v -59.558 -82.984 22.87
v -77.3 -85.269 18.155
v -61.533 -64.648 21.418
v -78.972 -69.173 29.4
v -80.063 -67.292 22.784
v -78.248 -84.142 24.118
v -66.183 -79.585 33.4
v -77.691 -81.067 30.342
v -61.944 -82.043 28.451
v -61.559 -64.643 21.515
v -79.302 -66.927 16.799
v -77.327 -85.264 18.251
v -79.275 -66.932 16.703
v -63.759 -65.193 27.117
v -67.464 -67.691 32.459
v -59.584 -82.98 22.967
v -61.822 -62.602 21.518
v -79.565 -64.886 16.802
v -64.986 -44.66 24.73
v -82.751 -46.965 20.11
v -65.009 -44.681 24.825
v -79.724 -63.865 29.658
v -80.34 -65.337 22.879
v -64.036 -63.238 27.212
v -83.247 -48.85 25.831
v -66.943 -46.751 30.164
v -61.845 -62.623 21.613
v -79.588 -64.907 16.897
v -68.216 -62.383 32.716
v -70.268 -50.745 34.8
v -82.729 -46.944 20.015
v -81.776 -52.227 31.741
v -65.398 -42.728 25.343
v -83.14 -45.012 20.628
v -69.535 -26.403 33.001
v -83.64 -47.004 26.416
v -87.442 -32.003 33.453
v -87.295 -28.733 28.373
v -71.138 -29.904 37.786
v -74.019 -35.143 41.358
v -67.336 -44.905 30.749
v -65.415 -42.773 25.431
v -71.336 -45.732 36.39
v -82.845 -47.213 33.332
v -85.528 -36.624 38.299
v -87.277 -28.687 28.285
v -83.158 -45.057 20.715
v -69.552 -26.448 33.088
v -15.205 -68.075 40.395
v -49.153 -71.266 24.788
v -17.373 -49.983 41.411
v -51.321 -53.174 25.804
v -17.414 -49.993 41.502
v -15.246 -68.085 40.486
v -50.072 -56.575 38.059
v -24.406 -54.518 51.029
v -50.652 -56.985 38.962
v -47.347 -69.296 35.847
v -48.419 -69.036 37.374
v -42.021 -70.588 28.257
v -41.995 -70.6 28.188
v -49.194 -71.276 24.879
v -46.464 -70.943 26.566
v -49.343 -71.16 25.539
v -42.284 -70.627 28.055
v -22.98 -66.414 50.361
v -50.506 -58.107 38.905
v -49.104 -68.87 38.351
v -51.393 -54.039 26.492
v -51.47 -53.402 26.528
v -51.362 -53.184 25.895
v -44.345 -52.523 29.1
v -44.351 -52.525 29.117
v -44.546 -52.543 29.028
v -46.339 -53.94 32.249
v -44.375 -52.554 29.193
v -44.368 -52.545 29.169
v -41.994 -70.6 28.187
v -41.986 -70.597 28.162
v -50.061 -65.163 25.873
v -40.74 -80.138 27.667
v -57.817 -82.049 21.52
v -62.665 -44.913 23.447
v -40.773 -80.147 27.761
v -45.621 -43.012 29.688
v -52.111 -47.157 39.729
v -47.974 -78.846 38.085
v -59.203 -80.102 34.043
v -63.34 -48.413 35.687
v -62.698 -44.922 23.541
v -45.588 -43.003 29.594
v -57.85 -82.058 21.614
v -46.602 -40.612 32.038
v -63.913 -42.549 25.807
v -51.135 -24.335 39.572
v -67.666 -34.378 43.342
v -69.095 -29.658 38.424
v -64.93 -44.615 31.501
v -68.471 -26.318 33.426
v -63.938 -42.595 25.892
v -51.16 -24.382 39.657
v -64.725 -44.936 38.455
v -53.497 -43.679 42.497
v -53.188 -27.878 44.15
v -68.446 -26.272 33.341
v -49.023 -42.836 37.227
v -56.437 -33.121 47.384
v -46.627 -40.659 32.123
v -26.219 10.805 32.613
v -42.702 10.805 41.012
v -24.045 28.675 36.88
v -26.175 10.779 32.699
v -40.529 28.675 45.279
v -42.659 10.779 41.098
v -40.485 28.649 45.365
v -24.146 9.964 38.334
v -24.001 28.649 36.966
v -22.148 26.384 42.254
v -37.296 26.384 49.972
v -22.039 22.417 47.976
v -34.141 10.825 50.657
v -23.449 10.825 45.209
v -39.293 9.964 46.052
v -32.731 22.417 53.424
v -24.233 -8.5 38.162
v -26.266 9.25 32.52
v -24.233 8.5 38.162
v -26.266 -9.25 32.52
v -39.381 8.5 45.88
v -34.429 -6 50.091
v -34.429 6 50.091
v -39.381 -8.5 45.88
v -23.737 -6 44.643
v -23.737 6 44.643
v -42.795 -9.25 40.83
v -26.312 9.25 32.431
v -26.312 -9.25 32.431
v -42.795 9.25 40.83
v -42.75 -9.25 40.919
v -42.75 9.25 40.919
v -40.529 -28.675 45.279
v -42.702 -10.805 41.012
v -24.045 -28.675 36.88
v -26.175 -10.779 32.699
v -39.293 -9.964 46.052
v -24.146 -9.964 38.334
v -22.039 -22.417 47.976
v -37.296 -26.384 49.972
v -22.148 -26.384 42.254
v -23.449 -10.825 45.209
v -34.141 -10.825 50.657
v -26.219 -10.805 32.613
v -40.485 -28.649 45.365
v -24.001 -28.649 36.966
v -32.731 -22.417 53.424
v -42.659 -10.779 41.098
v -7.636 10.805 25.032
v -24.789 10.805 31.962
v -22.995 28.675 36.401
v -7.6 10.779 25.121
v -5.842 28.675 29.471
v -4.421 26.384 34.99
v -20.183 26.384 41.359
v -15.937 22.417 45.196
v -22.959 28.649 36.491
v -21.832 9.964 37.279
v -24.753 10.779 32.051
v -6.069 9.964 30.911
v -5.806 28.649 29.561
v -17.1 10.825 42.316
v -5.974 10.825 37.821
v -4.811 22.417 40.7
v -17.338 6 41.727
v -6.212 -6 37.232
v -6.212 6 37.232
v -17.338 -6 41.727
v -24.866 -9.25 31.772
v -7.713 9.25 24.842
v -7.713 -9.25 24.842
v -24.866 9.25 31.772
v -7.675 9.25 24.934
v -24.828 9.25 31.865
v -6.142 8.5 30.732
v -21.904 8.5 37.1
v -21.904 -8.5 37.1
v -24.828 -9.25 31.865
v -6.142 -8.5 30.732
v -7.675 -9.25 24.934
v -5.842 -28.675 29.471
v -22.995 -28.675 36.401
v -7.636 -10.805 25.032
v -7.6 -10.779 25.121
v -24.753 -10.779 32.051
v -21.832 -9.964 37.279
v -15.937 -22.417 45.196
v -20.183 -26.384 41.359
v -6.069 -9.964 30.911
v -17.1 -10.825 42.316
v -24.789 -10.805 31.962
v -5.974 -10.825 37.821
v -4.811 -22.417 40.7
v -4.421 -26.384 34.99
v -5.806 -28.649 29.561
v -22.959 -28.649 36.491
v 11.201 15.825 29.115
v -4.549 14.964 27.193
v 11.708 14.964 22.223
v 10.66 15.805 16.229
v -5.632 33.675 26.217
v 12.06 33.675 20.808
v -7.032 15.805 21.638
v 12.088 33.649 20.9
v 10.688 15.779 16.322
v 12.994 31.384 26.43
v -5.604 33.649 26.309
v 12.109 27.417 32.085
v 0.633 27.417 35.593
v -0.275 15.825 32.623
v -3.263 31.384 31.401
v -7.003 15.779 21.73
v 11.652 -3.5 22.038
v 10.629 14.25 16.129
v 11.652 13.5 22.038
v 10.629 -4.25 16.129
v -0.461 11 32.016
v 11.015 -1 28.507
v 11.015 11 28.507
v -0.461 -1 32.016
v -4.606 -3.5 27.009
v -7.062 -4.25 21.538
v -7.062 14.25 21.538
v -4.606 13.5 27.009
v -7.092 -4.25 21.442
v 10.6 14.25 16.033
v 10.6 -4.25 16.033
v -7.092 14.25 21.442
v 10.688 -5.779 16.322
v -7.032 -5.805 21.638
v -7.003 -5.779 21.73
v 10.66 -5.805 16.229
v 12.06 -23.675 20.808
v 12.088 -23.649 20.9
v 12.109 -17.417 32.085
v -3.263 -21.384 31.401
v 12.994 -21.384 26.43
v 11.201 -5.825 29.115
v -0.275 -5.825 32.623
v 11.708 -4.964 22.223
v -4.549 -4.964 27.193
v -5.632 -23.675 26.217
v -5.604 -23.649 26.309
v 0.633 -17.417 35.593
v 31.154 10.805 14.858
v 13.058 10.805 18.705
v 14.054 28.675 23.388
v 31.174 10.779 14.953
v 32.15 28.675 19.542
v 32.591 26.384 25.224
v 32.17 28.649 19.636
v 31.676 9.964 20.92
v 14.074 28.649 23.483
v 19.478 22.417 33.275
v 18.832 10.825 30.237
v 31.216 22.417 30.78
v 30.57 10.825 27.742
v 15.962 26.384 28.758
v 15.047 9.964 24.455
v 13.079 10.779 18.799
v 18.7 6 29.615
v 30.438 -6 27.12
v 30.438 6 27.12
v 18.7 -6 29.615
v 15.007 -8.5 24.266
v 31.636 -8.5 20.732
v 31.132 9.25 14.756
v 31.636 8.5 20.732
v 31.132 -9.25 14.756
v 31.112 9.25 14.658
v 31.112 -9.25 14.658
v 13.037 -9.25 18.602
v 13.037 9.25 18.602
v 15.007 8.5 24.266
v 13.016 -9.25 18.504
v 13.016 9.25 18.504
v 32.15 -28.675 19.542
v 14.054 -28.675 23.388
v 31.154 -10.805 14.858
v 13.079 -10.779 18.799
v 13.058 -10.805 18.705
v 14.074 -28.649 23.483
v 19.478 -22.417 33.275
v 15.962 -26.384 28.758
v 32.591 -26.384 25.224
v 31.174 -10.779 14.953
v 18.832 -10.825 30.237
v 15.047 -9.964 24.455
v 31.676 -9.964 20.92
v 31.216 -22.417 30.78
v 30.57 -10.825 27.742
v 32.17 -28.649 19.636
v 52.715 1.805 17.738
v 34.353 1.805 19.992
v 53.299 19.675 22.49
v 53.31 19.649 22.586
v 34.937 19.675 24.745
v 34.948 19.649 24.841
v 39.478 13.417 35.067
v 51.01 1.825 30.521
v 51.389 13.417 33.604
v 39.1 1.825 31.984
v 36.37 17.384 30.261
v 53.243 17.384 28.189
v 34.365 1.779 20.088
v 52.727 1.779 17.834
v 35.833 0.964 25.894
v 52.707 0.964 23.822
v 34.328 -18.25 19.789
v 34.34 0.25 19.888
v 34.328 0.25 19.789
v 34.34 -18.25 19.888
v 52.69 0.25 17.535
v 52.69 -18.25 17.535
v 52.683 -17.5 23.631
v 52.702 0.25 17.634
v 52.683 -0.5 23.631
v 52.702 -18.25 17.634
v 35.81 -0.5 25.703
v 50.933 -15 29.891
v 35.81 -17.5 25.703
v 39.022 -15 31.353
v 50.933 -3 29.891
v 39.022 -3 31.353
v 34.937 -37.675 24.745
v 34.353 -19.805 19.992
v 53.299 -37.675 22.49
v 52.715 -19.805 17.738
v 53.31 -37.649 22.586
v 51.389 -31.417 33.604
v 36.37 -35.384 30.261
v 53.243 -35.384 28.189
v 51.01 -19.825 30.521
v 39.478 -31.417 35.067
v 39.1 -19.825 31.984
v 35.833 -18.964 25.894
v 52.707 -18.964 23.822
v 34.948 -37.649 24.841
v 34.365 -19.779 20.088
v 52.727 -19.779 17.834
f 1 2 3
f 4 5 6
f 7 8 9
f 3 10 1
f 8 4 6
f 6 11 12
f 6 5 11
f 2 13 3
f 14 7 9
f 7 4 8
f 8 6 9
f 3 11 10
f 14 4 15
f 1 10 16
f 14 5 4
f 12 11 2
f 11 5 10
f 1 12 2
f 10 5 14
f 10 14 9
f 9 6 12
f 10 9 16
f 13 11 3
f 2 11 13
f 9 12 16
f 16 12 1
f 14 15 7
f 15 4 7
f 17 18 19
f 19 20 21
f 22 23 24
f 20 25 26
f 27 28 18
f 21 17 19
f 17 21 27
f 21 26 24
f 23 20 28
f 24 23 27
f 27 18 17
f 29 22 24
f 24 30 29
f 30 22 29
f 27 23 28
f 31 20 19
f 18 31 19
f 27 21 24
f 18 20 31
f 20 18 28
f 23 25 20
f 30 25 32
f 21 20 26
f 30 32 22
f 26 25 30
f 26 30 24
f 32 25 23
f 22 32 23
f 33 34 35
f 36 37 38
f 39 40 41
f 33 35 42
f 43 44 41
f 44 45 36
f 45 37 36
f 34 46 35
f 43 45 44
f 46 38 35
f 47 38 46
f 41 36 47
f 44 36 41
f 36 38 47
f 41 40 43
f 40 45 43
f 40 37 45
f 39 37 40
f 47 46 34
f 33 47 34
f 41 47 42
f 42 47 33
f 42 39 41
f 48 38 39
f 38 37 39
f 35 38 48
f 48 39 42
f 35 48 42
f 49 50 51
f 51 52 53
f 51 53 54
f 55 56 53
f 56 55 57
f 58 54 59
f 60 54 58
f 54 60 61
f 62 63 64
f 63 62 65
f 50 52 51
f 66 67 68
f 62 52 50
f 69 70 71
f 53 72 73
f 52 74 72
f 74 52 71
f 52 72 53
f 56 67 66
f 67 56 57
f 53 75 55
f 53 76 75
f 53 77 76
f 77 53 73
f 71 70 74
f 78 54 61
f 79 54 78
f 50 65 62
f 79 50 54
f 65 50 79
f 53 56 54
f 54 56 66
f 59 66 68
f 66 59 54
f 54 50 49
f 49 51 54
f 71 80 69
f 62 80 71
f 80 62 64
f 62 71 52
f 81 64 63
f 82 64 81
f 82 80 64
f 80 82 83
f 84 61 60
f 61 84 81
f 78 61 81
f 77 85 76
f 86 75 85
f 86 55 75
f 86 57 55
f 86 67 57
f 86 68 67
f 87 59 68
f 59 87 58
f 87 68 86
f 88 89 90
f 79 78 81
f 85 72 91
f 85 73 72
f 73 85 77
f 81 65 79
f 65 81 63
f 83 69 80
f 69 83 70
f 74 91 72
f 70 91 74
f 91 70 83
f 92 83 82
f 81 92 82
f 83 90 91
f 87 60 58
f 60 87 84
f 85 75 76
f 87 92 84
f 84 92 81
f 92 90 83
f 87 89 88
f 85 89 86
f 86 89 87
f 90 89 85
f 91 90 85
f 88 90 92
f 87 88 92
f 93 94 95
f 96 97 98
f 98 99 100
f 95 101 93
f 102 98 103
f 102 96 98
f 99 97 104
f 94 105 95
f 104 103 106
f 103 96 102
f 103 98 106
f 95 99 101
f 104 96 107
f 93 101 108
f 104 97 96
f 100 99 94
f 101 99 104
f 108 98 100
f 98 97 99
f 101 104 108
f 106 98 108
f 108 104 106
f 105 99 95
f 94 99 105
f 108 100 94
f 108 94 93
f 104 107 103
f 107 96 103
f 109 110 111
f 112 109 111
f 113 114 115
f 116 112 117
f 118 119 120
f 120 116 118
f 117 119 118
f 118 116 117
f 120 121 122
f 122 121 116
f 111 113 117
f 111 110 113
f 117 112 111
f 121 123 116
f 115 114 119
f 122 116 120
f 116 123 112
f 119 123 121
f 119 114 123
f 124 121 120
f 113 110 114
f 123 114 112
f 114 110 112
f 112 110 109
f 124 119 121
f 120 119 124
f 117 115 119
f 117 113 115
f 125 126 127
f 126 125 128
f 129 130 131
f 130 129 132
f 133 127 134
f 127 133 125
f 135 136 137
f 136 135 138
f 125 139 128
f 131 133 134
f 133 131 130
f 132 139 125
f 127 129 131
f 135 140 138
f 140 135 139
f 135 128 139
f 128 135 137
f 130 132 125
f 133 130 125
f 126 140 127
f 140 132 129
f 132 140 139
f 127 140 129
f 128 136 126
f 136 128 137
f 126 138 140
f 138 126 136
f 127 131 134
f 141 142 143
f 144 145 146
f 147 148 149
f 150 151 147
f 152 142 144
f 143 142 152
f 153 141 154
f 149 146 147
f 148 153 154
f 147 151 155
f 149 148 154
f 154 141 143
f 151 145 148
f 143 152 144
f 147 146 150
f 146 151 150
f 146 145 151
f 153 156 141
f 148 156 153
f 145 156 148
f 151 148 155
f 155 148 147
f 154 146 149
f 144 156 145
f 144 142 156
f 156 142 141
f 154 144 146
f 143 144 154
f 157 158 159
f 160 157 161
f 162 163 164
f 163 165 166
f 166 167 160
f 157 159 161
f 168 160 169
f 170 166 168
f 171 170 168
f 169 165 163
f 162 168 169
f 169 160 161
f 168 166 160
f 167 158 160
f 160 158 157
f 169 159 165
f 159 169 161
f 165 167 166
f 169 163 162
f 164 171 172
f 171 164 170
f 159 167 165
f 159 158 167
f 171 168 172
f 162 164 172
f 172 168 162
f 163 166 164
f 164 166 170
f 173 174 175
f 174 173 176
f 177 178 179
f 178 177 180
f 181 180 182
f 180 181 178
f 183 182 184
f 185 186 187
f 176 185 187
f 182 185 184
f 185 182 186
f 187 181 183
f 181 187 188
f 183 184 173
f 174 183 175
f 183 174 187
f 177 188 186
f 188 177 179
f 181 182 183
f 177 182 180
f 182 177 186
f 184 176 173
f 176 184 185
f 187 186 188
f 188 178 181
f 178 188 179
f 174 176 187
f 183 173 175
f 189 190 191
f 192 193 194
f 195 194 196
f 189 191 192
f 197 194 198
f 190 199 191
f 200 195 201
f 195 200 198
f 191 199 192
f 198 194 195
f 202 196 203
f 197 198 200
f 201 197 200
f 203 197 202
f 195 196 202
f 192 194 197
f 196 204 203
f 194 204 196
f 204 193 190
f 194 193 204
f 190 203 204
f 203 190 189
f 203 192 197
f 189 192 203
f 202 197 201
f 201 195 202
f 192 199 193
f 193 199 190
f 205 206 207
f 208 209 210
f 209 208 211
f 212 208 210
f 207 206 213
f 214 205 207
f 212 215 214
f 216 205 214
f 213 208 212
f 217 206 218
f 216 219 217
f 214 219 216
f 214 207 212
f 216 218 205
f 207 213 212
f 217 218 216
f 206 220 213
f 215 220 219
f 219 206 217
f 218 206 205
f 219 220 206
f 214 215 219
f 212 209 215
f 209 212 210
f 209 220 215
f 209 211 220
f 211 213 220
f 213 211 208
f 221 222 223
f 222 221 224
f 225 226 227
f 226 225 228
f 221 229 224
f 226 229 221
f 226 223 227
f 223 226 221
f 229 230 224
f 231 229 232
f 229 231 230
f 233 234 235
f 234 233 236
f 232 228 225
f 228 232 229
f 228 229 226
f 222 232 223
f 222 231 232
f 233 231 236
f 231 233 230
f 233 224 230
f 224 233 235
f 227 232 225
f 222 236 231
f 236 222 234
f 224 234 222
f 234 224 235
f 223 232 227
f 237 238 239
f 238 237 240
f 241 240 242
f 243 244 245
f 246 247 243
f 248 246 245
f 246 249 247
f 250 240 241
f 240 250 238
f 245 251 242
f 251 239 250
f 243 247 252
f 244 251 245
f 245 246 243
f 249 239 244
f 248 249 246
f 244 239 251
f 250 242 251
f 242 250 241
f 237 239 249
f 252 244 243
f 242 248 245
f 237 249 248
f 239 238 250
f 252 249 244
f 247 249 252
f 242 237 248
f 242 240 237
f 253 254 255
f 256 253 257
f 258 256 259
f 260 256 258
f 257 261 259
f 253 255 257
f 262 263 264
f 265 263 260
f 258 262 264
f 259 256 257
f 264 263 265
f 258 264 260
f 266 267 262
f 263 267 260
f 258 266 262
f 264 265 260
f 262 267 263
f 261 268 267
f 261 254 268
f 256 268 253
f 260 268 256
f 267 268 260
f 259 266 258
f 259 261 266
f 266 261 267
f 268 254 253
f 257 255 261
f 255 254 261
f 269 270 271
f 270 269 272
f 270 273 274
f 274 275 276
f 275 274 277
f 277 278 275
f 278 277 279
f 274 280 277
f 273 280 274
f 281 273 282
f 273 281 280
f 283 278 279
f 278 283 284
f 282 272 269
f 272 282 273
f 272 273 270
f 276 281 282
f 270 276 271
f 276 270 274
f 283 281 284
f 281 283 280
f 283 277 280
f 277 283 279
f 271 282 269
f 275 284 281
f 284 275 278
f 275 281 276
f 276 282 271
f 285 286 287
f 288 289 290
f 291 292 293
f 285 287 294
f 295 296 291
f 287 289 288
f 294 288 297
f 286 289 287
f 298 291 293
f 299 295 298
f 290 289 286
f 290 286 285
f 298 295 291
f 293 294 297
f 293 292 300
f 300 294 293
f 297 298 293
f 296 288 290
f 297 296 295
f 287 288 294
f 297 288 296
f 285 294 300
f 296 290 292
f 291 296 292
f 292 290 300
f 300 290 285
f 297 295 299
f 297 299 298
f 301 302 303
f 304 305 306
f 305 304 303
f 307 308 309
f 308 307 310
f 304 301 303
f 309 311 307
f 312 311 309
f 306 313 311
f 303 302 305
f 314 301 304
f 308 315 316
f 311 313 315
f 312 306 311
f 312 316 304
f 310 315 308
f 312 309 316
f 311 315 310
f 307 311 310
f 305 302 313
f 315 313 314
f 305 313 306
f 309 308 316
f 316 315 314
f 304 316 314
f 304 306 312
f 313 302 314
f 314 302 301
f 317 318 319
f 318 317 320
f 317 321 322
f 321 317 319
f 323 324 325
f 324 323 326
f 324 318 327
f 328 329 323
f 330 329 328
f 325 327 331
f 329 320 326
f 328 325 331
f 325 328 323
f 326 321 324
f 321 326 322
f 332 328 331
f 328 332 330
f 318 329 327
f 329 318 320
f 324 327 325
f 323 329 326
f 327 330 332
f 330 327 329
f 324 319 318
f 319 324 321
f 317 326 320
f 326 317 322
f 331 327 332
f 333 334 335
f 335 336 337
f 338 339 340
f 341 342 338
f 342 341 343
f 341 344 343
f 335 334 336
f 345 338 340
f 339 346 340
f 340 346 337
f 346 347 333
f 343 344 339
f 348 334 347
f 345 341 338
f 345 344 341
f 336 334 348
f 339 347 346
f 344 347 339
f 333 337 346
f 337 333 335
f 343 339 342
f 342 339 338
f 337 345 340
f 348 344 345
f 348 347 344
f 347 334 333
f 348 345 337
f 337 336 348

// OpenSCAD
union () {
  union () {
    translate ([-47, -50, 19]) {
      rotate (a=10.000000000000002, v=[0, 0, 1]) {
        rotate (a=10.000000000000002, v=[1, 0, 0]) {
          rotate (a=-25.0, v=[0, 1, 0]) {
            translate ([17.4, 0, 0]) {
              translate ([0, 0, 239.07818057271746]) {
                rotate (a=0.0, v=[0, 1, 0]) {
                  translate ([0, 0, -239.07818057271746]) {
                    translate ([0, 0, 87.18393769497159]) {
                      rotate (a=-7.499999999999999, v=[1, 0, 0]) {
                        translate ([0, 0, -87.18393769497159]) {
                          rotate (a=90.0, v=[0, 0, 1]) {
                            color ([127/255, 53/85, 127/255, 1]) {
                              translate ([0, 0, 9]) {
                                hull () {
                                  translate ([0, 0, 0.05]) {
                                    linear_extrude (height=0.1, twist=0.0, convexity=0, center=true){
                                      polygon (points=[[9.125, 18.75], [9.125, -18.75], [-9.125, -18.75], [-9.125, 18.75]]);
                                    }
                                  }
                                  translate ([0, 0, 12]) {
                                    linear_extrude (height=0.1, twist=0.0, convexity=0, center=true){
                                      polygon (points=[[6, 16], [6, -16], [-6, -16], [-6, 16]]);
                                    }
                                  }
                                }
                              }
                            }
                          }
                        }
                      }
                    }
                  }
                }
              }
            }
          }
        }
      }
    }
    translate ([-47, -50, 19]) {
      rotate (a=10.000000000000002, v=[0, 0, 1]) {
        rotate (a=10.000000000000002, v=[1, 0, 0]) {
          rotate (a=-25.0, v=[0, 1, 0]) {
            translate ([17.4, 0, 0]) {
              translate ([0, 0, 239.07818057271746]) {
                rotate (a=5.0, v=[0, 1, 0]) {
                  translate ([0, 0, -239.07818057271746]) {
                    translate ([0, 0, 87.18393769497159]) {
                      rotate (a=-7.499999999999999, v=[1, 0, 0]) {
                        translate ([0, 0, -87.18393769497159]) {
                          color ([127/255, 53/85, 127/255, 1]) {
                            translate ([0, 0, 9]) {
                              hull () {
                                translate ([0, 0, 0.05]) {
                                  linear_extrude (height=0.1, twist=0.0, convexity=0, center=true){
                                    polygon (points=[[9.125, 18.75], [9.125, -18.75], [-9.125, -18.75], [-9.125, 18.75]]);
                                  }
                                }
                                translate ([0, 0, 12]) {
                                  linear_extrude (height=0.1, twist=0.0, convexity=0, center=true){
                                    polygon (points=[[6, 16], [6, -16], [-6, -16], [-6, 16]]);
                                  }
                                }
                              }
                            }
                          }
                        }
                      }
                    }
                  }
                }
              }
            }
          }
        }
      }
    }
    translate ([-47, -50, 19]) {
      rotate (a=10.000000000000002, v=[0, 0, 1]) {
        rotate (a=10.000000000000002, v=[1, 0, 0]) {
          rotate (a=-25.0, v=[0, 1, 0]) {
            translate ([17.4, 0, 0]) {
              translate ([0, 0, 239.07818057271746]) {
                rotate (a=5.0, v=[0, 1, 0]) {
                  translate ([0, 0, -239.07818057271746]) {
                    translate ([0, 0, 87.18393769497159]) {
                      rotate (a=14.999999999999998, v=[1, 0, 0]) {
                        translate ([0, 0, -87.18393769497159]) {
                          color ([44/51, 163/255, 163/255, 1]) {
                            translate ([0, 0, 9]) {
                              hull () {
                                translate ([0, 0, 0.05]) {
                                  linear_extrude (height=0.1, twist=0.0, convexity=0, center=true){
                                    polygon (points=[[9.25, 9.25], [9.25, -9.25], [-9.25, -9.25], [-9.25, 9.25]]);
                                  }
                                }
                                translate ([0, 0, 6]) {
                                  linear_extrude (height=0.1, twist=0.0, convexity=0, center=true){
                                    polygon (points=[[17/2, 17/2], [17/2, -17/2], [-17/2, -17/2], [-17/2, 17/2]]);
                                  }
                                }
                                translate ([0, 0, 12]) {
                                  linear_extrude (height=0.1, twist=0.0, convexity=0, center=true){
                                    polygon (points=[[6, 6], [6, -6], [-6, -6], [-6, 6]]);
                                  }
                                }
                              }
                            }
                          }
                        }
                      }
                    }
                  }
                }
              }
            }
          }
        }
      }
    }
    union () {
      translate ([-47, -50, 19]) {
        rotate (a=10.000000000000002, v=[0, 0, 1]) {
          rotate (a=10.000000000000002, v=[1, 0, 0]) {
            rotate (a=-25.0, v=[0, 1, 0]) {
              translate ([17.4, 0, 0]) {
                translate ([0, 0, 239.07818057271746]) {
                  rotate (a=10.0, v=[0, 1, 0]) {
                    translate ([0, 0, -239.07818057271746]) {
                      translate ([0, 0, 87.18393769497159]) {
                        rotate (a=-14.999999999999998, v=[1, 0, 0]) {
                          translate ([0, 0, -87.18393769497159]) {
                            color ([44/51, 163/255, 163/255, 1]) {
                              translate ([0, 0, 9]) {
                                hull () {
                                  translate ([0, 0, 0.05]) {
                                    linear_extrude (height=0.1, twist=0.0, convexity=0, center=true){
                                      polygon (points=[[9.25, 9.25], [9.25, -9.25], [-9.25, -9.25], [-9.25, 9.25]]);
                                    }
                                  }
                                  translate ([0, 0, 6]) {
                                    linear_extrude (height=0.1, twist=0.0, convexity=0, center=true){
                                      polygon (points=[[17/2, 17/2], [17/2, -17/2], [-17/2, -17/2], [-17/2, 17/2]]);
                                    }
                                  }
                                  translate ([0, 0, 12]) {
                                    linear_extrude (height=0.1, twist=0.0, convexity=0, center=true){
                                      polygon (points=[[6, 6], [6, -6], [-6, -6], [-6, 6]]);
                                    }
                                  }
                                }
                              }
                            }
                          }
                        }
                      }
                    }
                  }
                }
              }
            }
          }
        }
      }
      translate ([-47, -50, 19]) {
        rotate (a=10.000000000000002, v=[0, 0, 1]) {
          rotate (a=10.000000000000002, v=[1, 0, 0]) {
            rotate (a=-25.0, v=[0, 1, 0]) {
              translate ([17.4, 0, 0]) {
                translate ([0, 0, 239.07818057271746]) {
                  rotate (a=10.0, v=[0, 1, 0]) {
                    translate ([0, 0, -239.07818057271746]) {
                      translate ([0, 0, 87.18393769497159]) {
                        rotate (a=0.0, v=[1, 0, 0]) {
                          translate ([0, 0, -87.18393769497159]) {
                            color ([44/51, 163/255, 163/255, 1]) {
                              translate ([0, 0, 9]) {
                                hull () {
                                  translate ([0, 0, 0.05]) {
                                    linear_extrude (height=0.1, twist=0.0, convexity=0, center=true){
                                      polygon (points=[[9.25, 9.25], [9.25, -9.25], [-9.25, -9.25], [-9.25, 9.25]]);
                                    }
                                  }
                                  translate ([0, 0, 6]) {
                                    linear_extrude (height=0.1, twist=0.0, convexity=0, center=true){
                                      polygon (points=[[17/2, 17/2], [17/2, -17/2], [-17/2, -17/2], [-17/2, 17/2]]);
                                    }
                                  }
                                  translate ([0, 0, 12]) {
                                    linear_extrude (height=0.1, twist=0.0, convexity=0, center=true){
                                      polygon (points=[[6, 6], [6, -6], [-6, -6], [-6, 6]]);
                                    }
                                  }
                                }
                              }
                            }
                          }
                        }
                      }
                    }
                  }
                }
              }
            }
          }
        }
      }
      translate ([-47, -50, 19]) {
        rotate (a=10.000000000000002, v=[0, 0, 1]) {
          rotate (a=10.000000000000002, v=[1, 0, 0]) {
            rotate (a=-25.0, v=[0, 1, 0]) {
              translate ([17.4, 0, 0]) {
                translate ([0, 0, 239.07818057271746]) {
                  rotate (a=10.0, v=[0, 1, 0]) {
                    translate ([0, 0, -239.07818057271746]) {
                      translate ([0, 0, 87.18393769497159]) {
                        rotate (a=14.999999999999998, v=[1, 0, 0]) {
                          translate ([0, 0, -87.18393769497159]) {
                            color ([44/51, 163/255, 163/255, 1]) {
                              translate ([0, 0, 9]) {
                                hull () {
                                  translate ([0, 0, 0.05]) {
                                    linear_extrude (height=0.1, twist=0.0, convexity=0, center=true){
                                      polygon (points=[[9.25, 9.25], [9.25, -9.25], [-9.25, -9.25], [-9.25, 9.25]]);
                                    }
                                  }
                                  translate ([0, 0, 6]) {
                                    linear_extrude (height=0.1, twist=0.0, convexity=0, center=true){
                                      polygon (points=[[17/2, 17/2], [17/2, -17/2], [-17/2, -17/2], [-17/2, 17/2]]);
                                    }
                                  }
                                  translate ([0, 0, 12]) {
                                    linear_extrude (height=0.1, twist=0.0, convexity=0, center=true){
                                      polygon (points=[[6, 6], [6, -6], [-6, -6], [-6, 6]]);
                                    }
                                  }
                                }
                              }
                            }
                          }
                        }
                      }
                    }
                  }
                }
              }
            }
          }
        }
      }
    }
  }
  union () {
    translate ([0, 0, 13]) {
      rotate (a=17.0, v=[0, 1, 0]) {
        translate ([0, 0, 0]) {
          translate ([0, 0, 239.0781805727174]) {
            rotate (a=10.000000000000002, v=[0, 1, 0]) {
              translate ([0, 0, -239.0781805727174]) {
                translate ([0, 0, 85.26861330108649]) {
                  rotate (a=14.999999999999998, v=[1, 0, 0]) {
                    translate ([0, 0, -85.26861330108649]) {
                      color ([44/51, 163/255, 163/255, 1]) {
                        translate ([0, 0, 9]) {
                          hull () {
                            translate ([0, 0, 0.05]) {
                              linear_extrude (height=0.1, twist=0.0, convexity=0, center=true){
                                polygon (points=[[9.25, 9.25], [9.25, -9.25], [-9.25, -9.25], [-9.25, 9.25]]);
                              }
                            }
                            translate ([0, 0, 6]) {
                              linear_extrude (height=0.1, twist=0.0, convexity=0, center=true){
                                polygon (points=[[17/2, 17/2], [17/2, -17/2], [-17/2, -17/2], [-17/2, 17/2]]);
                              }
                            }
                            translate ([0, 0, 12]) {
                              linear_extrude (height=0.1, twist=0.0, convexity=0, center=true){
                                polygon (points=[[6, 6], [6, -6], [-6, -6], [-6, 6]]);
                              }
                            }
                          }
                        }
                      }
                    }
                  }
                }
              }
            }
          }
        }
      }
    }
    translate ([0, 0, 13]) {
      rotate (a=17.0, v=[0, 1, 0]) {
        translate ([0, 0, 0]) {
          translate ([0, 0, 239.0781805727174]) {
            rotate (a=10.000000000000002, v=[0, 1, 0]) {
              translate ([0, 0, -239.0781805727174]) {
                translate ([0, 0, 85.26861330108649]) {
                  rotate (a=0.0, v=[1, 0, 0]) {
                    translate ([0, 0, -85.26861330108649]) {
                      color ([44/51, 163/255, 163/255, 1]) {
                        translate ([0, 0, 9]) {
                          hull () {
                            translate ([0, 0, 0.05]) {
                              linear_extrude (height=0.1, twist=0.0, convexity=0, center=true){
                                polygon (points=[[9.25, 9.25], [9.25, -9.25], [-9.25, -9.25], [-9.25, 9.25]]);
                              }
                            }
                            translate ([0, 0, 6]) {
                              linear_extrude (height=0.1, twist=0.0, convexity=0, center=true){
                                polygon (points=[[17/2, 17/2], [17/2, -17/2], [-17/2, -17/2], [-17/2, 17/2]]);
                              }
                            }
                            translate ([0, 0, 12]) {
                              linear_extrude (height=0.1, twist=0.0, convexity=0, center=true){
                                polygon (points=[[6, 6], [6, -6], [-6, -6], [-6, 6]]);
                              }
                            }
                          }
                        }
                      }
                    }
                  }
                }
              }
            }
          }
        }
      }
    }
    translate ([0, 0, 13]) {
      rotate (a=17.0, v=[0, 1, 0]) {
        translate ([0, 0, 0]) {
          translate ([0, 0, 239.0781805727174]) {
            rotate (a=10.000000000000002, v=[0, 1, 0]) {
              translate ([0, 0, -239.0781805727174]) {
                translate ([0, 0, 85.26861330108649]) {
                  rotate (a=-14.999999999999998, v=[1, 0, 0]) {
                    translate ([0, 0, -85.26861330108649]) {
                      color ([44/51, 163/255, 163/255, 1]) {
                        translate ([0, 0, 9]) {
                          hull () {
                            translate ([0, 0, 0.05]) {
                              linear_extrude (height=0.1, twist=0.0, convexity=0, center=true){
                                polygon (points=[[9.25, 9.25], [9.25, -9.25], [-9.25, -9.25], [-9.25, 9.25]]);
                              }
                            }
                            translate ([0, 0, 6]) {
                              linear_extrude (height=0.1, twist=0.0, convexity=0, center=true){
                                polygon (points=[[17/2, 17/2], [17/2, -17/2], [-17/2, -17/2], [-17/2, 17/2]]);
                              }
                            }
                            translate ([0, 0, 12]) {
                              linear_extrude (height=0.1, twist=0.0, convexity=0, center=true){
                                polygon (points=[[6, 6], [6, -6], [-6, -6], [-6, 6]]);
                              }
                            }
                          }
                        }
                      }
                    }
                  }
                }
              }
            }
          }
        }
      }
    }
    translate ([0, 0, 13]) {
      rotate (a=17.0, v=[0, 1, 0]) {
        translate ([0, 0, 0]) {
          translate ([0, 0, 239.0781805727174]) {
            rotate (a=5.000000000000001, v=[0, 1, 0]) {
              translate ([0, 0, -239.0781805727174]) {
                translate ([0, 0, 85.26861330108649]) {
                  rotate (a=14.999999999999998, v=[1, 0, 0]) {
                    translate ([0, 0, -85.26861330108649]) {
                      color ([44/51, 163/255, 163/255, 1]) {
                        translate ([0, 0, 9]) {
                          hull () {
                            translate ([0, 0, 0.05]) {
                              linear_extrude (height=0.1, twist=0.0, convexity=0, center=true){
                                polygon (points=[[9.25, 9.25], [9.25, -9.25], [-9.25, -9.25], [-9.25, 9.25]]);
                              }
                            }
                            translate ([0, 0, 6]) {
                              linear_extrude (height=0.1, twist=0.0, convexity=0, center=true){
                                polygon (points=[[17/2, 17/2], [17/2, -17/2], [-17/2, -17/2], [-17/2, 17/2]]);
                              }
                            }
                            translate ([0, 0, 12]) {
                              linear_extrude (height=0.1, twist=0.0, convexity=0, center=true){
                                polygon (points=[[6, 6], [6, -6], [-6, -6], [-6, 6]]);
                              }
                            }
                          }
                        }
                      }
                    }
                  }
                }
              }
            }
          }
        }
      }
    }
    translate ([0, 0, 13]) {
      rotate (a=17.0, v=[0, 1, 0]) {
        translate ([0, 0, 0]) {
          translate ([0, 0, 239.0781805727174]) {
            rotate (a=5.000000000000001, v=[0, 1, 0]) {
              translate ([0, 0, -239.0781805727174]) {
                translate ([0, 0, 85.26861330108649]) {
                  rotate (a=0.0, v=[1, 0, 0]) {
                    translate ([0, 0, -85.26861330108649]) {
                      color ([44/51, 163/255, 163/255, 1]) {
                        translate ([0, 0, 9]) {
                          hull () {
                            translate ([0, 0, 0.05]) {
                              linear_extrude (height=0.1, twist=0.0, convexity=0, center=true){
                                polygon (points=[[9.25, 9.25], [9.25, -9.25], [-9.25, -9.25], [-9.25, 9.25]]);
                              }
                            }
                            translate ([0, 0, 6]) {
                              linear_extrude (height=0.1, twist=0.0, convexity=0, center=true){
                                polygon (points=[[17/2, 17/2], [17/2, -17/2], [-17/2, -17/2], [-17/2, 17/2]]);
                              }
                            }
                            translate ([0, 0, 12]) {
                              linear_extrude (height=0.1, twist=0.0, convexity=0, center=true){
                                polygon (points=[[6, 6], [6, -6], [-6, -6], [-6, 6]]);
                              }
                            }
                          }
                        }
                      }
                    }
                  }
                }
              }
            }
          }
        }
      }
    }
    translate ([0, 0, 13]) {
      rotate (a=17.0, v=[0, 1, 0]) {
        translate ([0, 0, 0]) {
          translate ([0, 0, 239.0781805727174]) {
            rotate (a=5.000000000000001, v=[0, 1, 0]) {
              translate ([0, 0, -239.0781805727174]) {
                translate ([0, 0, 85.26861330108649]) {
                  rotate (a=-14.999999999999998, v=[1, 0, 0]) {
                    translate ([0, 0, -85.26861330108649]) {
                      color ([44/51, 163/255, 163/255, 1]) {
                        translate ([0, 0, 9]) {
                          hull () {
                            translate ([0, 0, 0.05]) {
                              linear_extrude (height=0.1, twist=0.0, convexity=0, center=true){
                                polygon (points=[[9.25, 9.25], [9.25, -9.25], [-9.25, -9.25], [-9.25, 9.25]]);
                              }
                            }
                            translate ([0, 0, 6]) {
                              linear_extrude (height=0.1, twist=0.0, convexity=0, center=true){
                                polygon (points=[[17/2, 17/2], [17/2, -17/2], [-17/2, -17/2], [-17/2, 17/2]]);
                              }
                            }
                            translate ([0, 0, 12]) {
                              linear_extrude (height=0.1, twist=0.0, convexity=0, center=true){
                                polygon (points=[[6, 6], [6, -6], [-6, -6], [-6, 6]]);
                              }
                            }
                          }
                        }
                      }
                    }
                  }
                }
              }
            }
          }
        }
      }
    }
    translate ([0, 0, 13]) {
      rotate (a=17.0, v=[0, 1, 0]) {
        translate ([0, 5, -3.0]) {
          translate ([0, 0, 239.0781805727174]) {
            rotate (a=0.0, v=[0, 1, 0]) {
              translate ([0, 0, -239.0781805727174]) {
                translate ([0, 0, 85.26861330108649]) {
                  rotate (a=14.999999999999998, v=[1, 0, 0]) {
                    translate ([0, 0, -85.26861330108649]) {
                      color ([44/51, 163/255, 163/255, 1]) {
                        translate ([0, 0, 9]) {
                          hull () {
                            translate ([0, 0, 0.05]) {
                              linear_extrude (height=0.1, twist=0.0, convexity=0, center=true){
                                polygon (points=[[9.25, 9.25], [9.25, -9.25], [-9.25, -9.25], [-9.25, 9.25]]);
                              }
                            }
                            translate ([0, 0, 6]) {
                              linear_extrude (height=0.1, twist=0.0, convexity=0, center=true){
                                polygon (points=[[17/2, 17/2], [17/2, -17/2], [-17/2, -17/2], [-17/2, 17/2]]);
                              }
                            }
                            translate ([0, 0, 12]) {
                              linear_extrude (height=0.1, twist=0.0, convexity=0, center=true){
                                polygon (points=[[6, 6], [6, -6], [-6, -6], [-6, 6]]);
                              }
                            }
                          }
                        }
                      }
                    }
                  }
                }
              }
            }
          }
        }
      }
    }
    translate ([0, 0, 13]) {
      rotate (a=17.0, v=[0, 1, 0]) {
        translate ([0, 5, -3.0]) {
          translate ([0, 0, 239.0781805727174]) {
            rotate (a=0.0, v=[0, 1, 0]) {
              translate ([0, 0, -239.0781805727174]) {
                translate ([0, 0, 85.26861330108649]) {
                  rotate (a=0.0, v=[1, 0, 0]) {
                    translate ([0, 0, -85.26861330108649]) {
                      color ([44/51, 163/255, 163/255, 1]) {
                        translate ([0, 0, 9]) {
                          hull () {
                            translate ([0, 0, 0.05]) {
                              linear_extrude (height=0.1, twist=0.0, convexity=0, center=true){
                                polygon (points=[[9.25, 9.25], [9.25, -9.25], [-9.25, -9.25], [-9.25, 9.25]]);
                              }
                            }
                            translate ([0, 0, 6]) {
                              linear_extrude (height=0.1, twist=0.0, convexity=0, center=true){
                                polygon (points=[[17/2, 17/2], [17/2, -17/2], [-17/2, -17/2], [-17/2, 17/2]]);
                              }
                            }
                            translate ([0, 0, 12]) {
                              linear_extrude (height=0.1, twist=0.0, convexity=0, center=true){
                                polygon (points=[[6, 6], [6, -6], [-6, -6], [-6, 6]]);
                              }
                            }
                          }
                        }
                      }
                    }
                  }
                }
              }
            }
          }
        }
      }
    }
    translate ([0, 0, 13]) {
      rotate (a=17.0, v=[0, 1, 0]) {
        translate ([0, 5, -3.0]) {
          translate ([0, 0, 239.0781805727174]) {
            rotate (a=0.0, v=[0, 1, 0]) {
              translate ([0, 0, -239.0781805727174]) {
                translate ([0, 0, 85.26861330108649]) {
                  rotate (a=-14.999999999999998, v=[1, 0, 0]) {
                    translate ([0, 0, -85.26861330108649]) {
                      color ([44/51, 163/255, 163/255, 1]) {
                        translate ([0, 0, 9]) {
                          hull () {
                            translate ([0, 0, 0.05]) {
                              linear_extrude (height=0.1, twist=0.0, convexity=0, center=true){
                                polygon (points=[[9.25, 9.25], [9.25, -9.25], [-9.25, -9.25], [-9.25, 9.25]]);
                              }
                            }
                            translate ([0, 0, 6]) {
                              linear_extrude (height=0.1, twist=0.0, convexity=0, center=true){
                                polygon (points=[[17/2, 17/2], [17/2, -17/2], [-17/2, -17/2], [-17/2, 17/2]]);
                              }
                            }
                            translate ([0, 0, 12]) {
                              linear_extrude (height=0.1, twist=0.0, convexity=0, center=true){
                                polygon (points=[[6, 6], [6, -6], [-6, -6], [-6, 6]]);
                              }
                            }
                          }
                        }
                      }
                    }
                  }
                }
              }
            }
          }
        }
      }
    }
    translate ([0, 0, 13]) {
      rotate (a=17.0, v=[0, 1, 0]) {
        translate ([0, 0, 0]) {
          translate ([0, 0, 239.0781805727174]) {
            rotate (a=-5.000000000000001, v=[0, 1, 0]) {
              translate ([0, 0, -239.0781805727174]) {
                translate ([0, 0, 85.26861330108649]) {
                  rotate (a=14.999999999999998, v=[1, 0, 0]) {
                    translate ([0, 0, -85.26861330108649]) {
                      color ([44/51, 163/255, 163/255, 1]) {
                        translate ([0, 0, 9]) {
                          hull () {
                            translate ([0, 0, 0.05]) {
                              linear_extrude (height=0.1, twist=0.0, convexity=0, center=true){
                                polygon (points=[[9.25, 9.25], [9.25, -9.25], [-9.25, -9.25], [-9.25, 9.25]]);
                              }
                            }
                            translate ([0, 0, 6]) {
                              linear_extrude (height=0.1, twist=0.0, convexity=0, center=true){
                                polygon (points=[[17/2, 17/2], [17/2, -17/2], [-17/2, -17/2], [-17/2, 17/2]]);
                              }
                            }
                            translate ([0, 0, 12]) {
                              linear_extrude (height=0.1, twist=0.0, convexity=0, center=true){
                                polygon (points=[[6, 6], [6, -6], [-6, -6], [-6, 6]]);
                              }
                            }
                          }
                        }
                      }
                    }
                  }
                }
              }
            }
          }
        }
      }
    }
    translate ([0, 0, 13]) {
      rotate (a=17.0, v=[0, 1, 0]) {
        translate ([0, 0, 0]) {
          translate ([0, 0, 239.0781805727174]) {
            rotate (a=-5.000000000000001, v=[0, 1, 0]) {
              translate ([0, 0, -239.0781805727174]) {
                translate ([0, 0, 85.26861330108649]) {
                  rotate (a=0.0, v=[1, 0, 0]) {
                    translate ([0, 0, -85.26861330108649]) {
                      color ([44/51, 163/255, 163/255, 1]) {
                        translate ([0, 0, 9]) {
                          hull () {
                            translate ([0, 0, 0.05]) {
                              linear_extrude (height=0.1, twist=0.0, convexity=0, center=true){
                                polygon (points=[[9.25, 9.25], [9.25, -9.25], [-9.25, -9.25], [-9.25, 9.25]]);
                              }
                            }
                            translate ([0, 0, 6]) {
                              linear_extrude (height=0.1, twist=0.0, convexity=0, center=true){
                                polygon (points=[[17/2, 17/2], [17/2, -17/2], [-17/2, -17/2], [-17/2, 17/2]]);
                              }
                            }
                            translate ([0, 0, 12]) {
                              linear_extrude (height=0.1, twist=0.0, convexity=0, center=true){
                                polygon (points=[[6, 6], [6, -6], [-6, -6], [-6, 6]]);
                              }
                            }
                          }
                        }
                      }
                    }
                  }
                }
              }
            }
          }
        }
      }
    }
    translate ([0, 0, 13]) {
      rotate (a=17.0, v=[0, 1, 0]) {
        translate ([0, 0, 0]) {
          translate ([0, 0, 239.0781805727174]) {
            rotate (a=-5.000000000000001, v=[0, 1, 0]) {
              translate ([0, 0, -239.0781805727174]) {
                translate ([0, 0, 85.26861330108649]) {
                  rotate (a=-14.999999999999998, v=[1, 0, 0]) {
                    translate ([0, 0, -85.26861330108649]) {
                      color ([44/51, 163/255, 163/255, 1]) {
                        translate ([0, 0, 9]) {
                          hull () {
                            translate ([0, 0, 0.05]) {
                              linear_extrude (height=0.1, twist=0.0, convexity=0, center=true){
                                polygon (points=[[9.25, 9.25], [9.25, -9.25], [-9.25, -9.25], [-9.25, 9.25]]);
                              }
                            }
                            translate ([0, 0, 6]) {
                              linear_extrude (height=0.1, twist=0.0, convexity=0, center=true){
                                polygon (points=[[17/2, 17/2], [17/2, -17/2], [-17/2, -17/2], [-17/2, 17/2]]);
                              }
                            }
                            translate ([0, 0, 12]) {
                              linear_extrude (height=0.1, twist=0.0, convexity=0, center=true){
                                polygon (points=[[6, 6], [6, -6], [-6, -6], [-6, 6]]);
                              }
                            }
                          }
                        }
                      }
                    }
                  }
                }
              }
            }
          }
        }
      }
    }
    translate ([0, 0, 13]) {
      rotate (a=17.0, v=[0, 1, 0]) {
        translate ([0, -9, 5.64]) {
          translate ([0, 0, 239.0781805727174]) {
            rotate (a=-10.000000000000002, v=[0, 1, 0]) {
              translate ([0, 0, -239.0781805727174]) {
                translate ([0, 0, 85.26861330108649]) {
                  rotate (a=14.999999999999998, v=[1, 0, 0]) {
                    translate ([0, 0, -85.26861330108649]) {
                      color ([44/51, 163/255, 163/255, 1]) {
                        translate ([0, 0, 9]) {
                          hull () {
                            translate ([0, 0, 0.05]) {
                              linear_extrude (height=0.1, twist=0.0, convexity=0, center=true){
                                polygon (points=[[9.25, 9.25], [9.25, -9.25], [-9.25, -9.25], [-9.25, 9.25]]);
                              }
                            }
                            translate ([0, 0, 6]) {
                              linear_extrude (height=0.1, twist=0.0, convexity=0, center=true){
                                polygon (points=[[17/2, 17/2], [17/2, -17/2], [-17/2, -17/2], [-17/2, 17/2]]);
                              }
                            }
                            translate ([0, 0, 12]) {
                              linear_extrude (height=0.1, twist=0.0, convexity=0, center=true){
                                polygon (points=[[6, 6], [6, -6], [-6, -6], [-6, 6]]);
                              }
                            }
                          }
                        }
                      }
                    }
                  }
                }
              }
            }
          }
        }
      }
    }
    translate ([0, 0, 13]) {
      rotate (a=17.0, v=[0, 1, 0]) {
        translate ([0, -9, 5.64]) {
          translate ([0, 0, 239.0781805727174]) {
            rotate (a=-10.000000000000002, v=[0, 1, 0]) {
              translate ([0, 0, -239.0781805727174]) {
                translate ([0, 0, 85.26861330108649]) {
                  rotate (a=0.0, v=[1, 0, 0]) {
                    translate ([0, 0, -85.26861330108649]) {
                      color ([44/51, 163/255, 163/255, 1]) {
                        translate ([0, 0, 9]) {
                          hull () {
                            translate ([0, 0, 0.05]) {
                              linear_extrude (height=0.1, twist=0.0, convexity=0, center=true){
                                polygon (points=[[9.25, 9.25], [9.25, -9.25], [-9.25, -9.25], [-9.25, 9.25]]);
                              }
                            }
                            translate ([0, 0, 6]) {
                              linear_extrude (height=0.1, twist=0.0, convexity=0, center=true){
                                polygon (points=[[17/2, 17/2], [17/2, -17/2], [-17/2, -17/2], [-17/2, 17/2]]);
                              }
                            }
                            translate ([0, 0, 12]) {
                              linear_extrude (height=0.1, twist=0.0, convexity=0, center=true){
                                polygon (points=[[6, 6], [6, -6], [-6, -6], [-6, 6]]);
                              }
                            }
                          }
                        }
                      }
                    }
                  }
                }
              }
            }
          }
        }
      }
    }
    translate ([0, 0, 13]) {
      rotate (a=17.0, v=[0, 1, 0]) {
        translate ([0, -9, 5.64]) {
          translate ([0, 0, 239.0781805727174]) {
            rotate (a=-10.000000000000002, v=[0, 1, 0]) {
              translate ([0, 0, -239.0781805727174]) {
                translate ([0, 0, 85.26861330108649]) {
                  rotate (a=-14.999999999999998, v=[1, 0, 0]) {
                    translate ([0, 0, -85.26861330108649]) {
                      color ([44/51, 163/255, 163/255, 1]) {
                        translate ([0, 0, 9]) {
                          hull () {
                            translate ([0, 0, 0.05]) {
                              linear_extrude (height=0.1, twist=0.0, convexity=0, center=true){
                                polygon (points=[[9.25, 9.25], [9.25, -9.25], [-9.25, -9.25], [-9.25, 9.25]]);
                              }
                            }
                            translate ([0, 0, 6]) {
                              linear_extrude (height=0.1, twist=0.0, convexity=0, center=true){
                                polygon (points=[[17/2, 17/2], [17/2, -17/2], [-17/2, -17/2], [-17/2, 17/2]]);
                              }
                            }
                            translate ([0, 0, 12]) {
                              linear_extrude (height=0.1, twist=0.0, convexity=0, center=true){
                                polygon (points=[[6, 6], [6, -6], [-6, -6], [-6, 6]]);
                              }
                            }
                          }
                        }
                      }
                    }
                  }
                }
              }
            }
          }
        }
      }
    }
  }
}
